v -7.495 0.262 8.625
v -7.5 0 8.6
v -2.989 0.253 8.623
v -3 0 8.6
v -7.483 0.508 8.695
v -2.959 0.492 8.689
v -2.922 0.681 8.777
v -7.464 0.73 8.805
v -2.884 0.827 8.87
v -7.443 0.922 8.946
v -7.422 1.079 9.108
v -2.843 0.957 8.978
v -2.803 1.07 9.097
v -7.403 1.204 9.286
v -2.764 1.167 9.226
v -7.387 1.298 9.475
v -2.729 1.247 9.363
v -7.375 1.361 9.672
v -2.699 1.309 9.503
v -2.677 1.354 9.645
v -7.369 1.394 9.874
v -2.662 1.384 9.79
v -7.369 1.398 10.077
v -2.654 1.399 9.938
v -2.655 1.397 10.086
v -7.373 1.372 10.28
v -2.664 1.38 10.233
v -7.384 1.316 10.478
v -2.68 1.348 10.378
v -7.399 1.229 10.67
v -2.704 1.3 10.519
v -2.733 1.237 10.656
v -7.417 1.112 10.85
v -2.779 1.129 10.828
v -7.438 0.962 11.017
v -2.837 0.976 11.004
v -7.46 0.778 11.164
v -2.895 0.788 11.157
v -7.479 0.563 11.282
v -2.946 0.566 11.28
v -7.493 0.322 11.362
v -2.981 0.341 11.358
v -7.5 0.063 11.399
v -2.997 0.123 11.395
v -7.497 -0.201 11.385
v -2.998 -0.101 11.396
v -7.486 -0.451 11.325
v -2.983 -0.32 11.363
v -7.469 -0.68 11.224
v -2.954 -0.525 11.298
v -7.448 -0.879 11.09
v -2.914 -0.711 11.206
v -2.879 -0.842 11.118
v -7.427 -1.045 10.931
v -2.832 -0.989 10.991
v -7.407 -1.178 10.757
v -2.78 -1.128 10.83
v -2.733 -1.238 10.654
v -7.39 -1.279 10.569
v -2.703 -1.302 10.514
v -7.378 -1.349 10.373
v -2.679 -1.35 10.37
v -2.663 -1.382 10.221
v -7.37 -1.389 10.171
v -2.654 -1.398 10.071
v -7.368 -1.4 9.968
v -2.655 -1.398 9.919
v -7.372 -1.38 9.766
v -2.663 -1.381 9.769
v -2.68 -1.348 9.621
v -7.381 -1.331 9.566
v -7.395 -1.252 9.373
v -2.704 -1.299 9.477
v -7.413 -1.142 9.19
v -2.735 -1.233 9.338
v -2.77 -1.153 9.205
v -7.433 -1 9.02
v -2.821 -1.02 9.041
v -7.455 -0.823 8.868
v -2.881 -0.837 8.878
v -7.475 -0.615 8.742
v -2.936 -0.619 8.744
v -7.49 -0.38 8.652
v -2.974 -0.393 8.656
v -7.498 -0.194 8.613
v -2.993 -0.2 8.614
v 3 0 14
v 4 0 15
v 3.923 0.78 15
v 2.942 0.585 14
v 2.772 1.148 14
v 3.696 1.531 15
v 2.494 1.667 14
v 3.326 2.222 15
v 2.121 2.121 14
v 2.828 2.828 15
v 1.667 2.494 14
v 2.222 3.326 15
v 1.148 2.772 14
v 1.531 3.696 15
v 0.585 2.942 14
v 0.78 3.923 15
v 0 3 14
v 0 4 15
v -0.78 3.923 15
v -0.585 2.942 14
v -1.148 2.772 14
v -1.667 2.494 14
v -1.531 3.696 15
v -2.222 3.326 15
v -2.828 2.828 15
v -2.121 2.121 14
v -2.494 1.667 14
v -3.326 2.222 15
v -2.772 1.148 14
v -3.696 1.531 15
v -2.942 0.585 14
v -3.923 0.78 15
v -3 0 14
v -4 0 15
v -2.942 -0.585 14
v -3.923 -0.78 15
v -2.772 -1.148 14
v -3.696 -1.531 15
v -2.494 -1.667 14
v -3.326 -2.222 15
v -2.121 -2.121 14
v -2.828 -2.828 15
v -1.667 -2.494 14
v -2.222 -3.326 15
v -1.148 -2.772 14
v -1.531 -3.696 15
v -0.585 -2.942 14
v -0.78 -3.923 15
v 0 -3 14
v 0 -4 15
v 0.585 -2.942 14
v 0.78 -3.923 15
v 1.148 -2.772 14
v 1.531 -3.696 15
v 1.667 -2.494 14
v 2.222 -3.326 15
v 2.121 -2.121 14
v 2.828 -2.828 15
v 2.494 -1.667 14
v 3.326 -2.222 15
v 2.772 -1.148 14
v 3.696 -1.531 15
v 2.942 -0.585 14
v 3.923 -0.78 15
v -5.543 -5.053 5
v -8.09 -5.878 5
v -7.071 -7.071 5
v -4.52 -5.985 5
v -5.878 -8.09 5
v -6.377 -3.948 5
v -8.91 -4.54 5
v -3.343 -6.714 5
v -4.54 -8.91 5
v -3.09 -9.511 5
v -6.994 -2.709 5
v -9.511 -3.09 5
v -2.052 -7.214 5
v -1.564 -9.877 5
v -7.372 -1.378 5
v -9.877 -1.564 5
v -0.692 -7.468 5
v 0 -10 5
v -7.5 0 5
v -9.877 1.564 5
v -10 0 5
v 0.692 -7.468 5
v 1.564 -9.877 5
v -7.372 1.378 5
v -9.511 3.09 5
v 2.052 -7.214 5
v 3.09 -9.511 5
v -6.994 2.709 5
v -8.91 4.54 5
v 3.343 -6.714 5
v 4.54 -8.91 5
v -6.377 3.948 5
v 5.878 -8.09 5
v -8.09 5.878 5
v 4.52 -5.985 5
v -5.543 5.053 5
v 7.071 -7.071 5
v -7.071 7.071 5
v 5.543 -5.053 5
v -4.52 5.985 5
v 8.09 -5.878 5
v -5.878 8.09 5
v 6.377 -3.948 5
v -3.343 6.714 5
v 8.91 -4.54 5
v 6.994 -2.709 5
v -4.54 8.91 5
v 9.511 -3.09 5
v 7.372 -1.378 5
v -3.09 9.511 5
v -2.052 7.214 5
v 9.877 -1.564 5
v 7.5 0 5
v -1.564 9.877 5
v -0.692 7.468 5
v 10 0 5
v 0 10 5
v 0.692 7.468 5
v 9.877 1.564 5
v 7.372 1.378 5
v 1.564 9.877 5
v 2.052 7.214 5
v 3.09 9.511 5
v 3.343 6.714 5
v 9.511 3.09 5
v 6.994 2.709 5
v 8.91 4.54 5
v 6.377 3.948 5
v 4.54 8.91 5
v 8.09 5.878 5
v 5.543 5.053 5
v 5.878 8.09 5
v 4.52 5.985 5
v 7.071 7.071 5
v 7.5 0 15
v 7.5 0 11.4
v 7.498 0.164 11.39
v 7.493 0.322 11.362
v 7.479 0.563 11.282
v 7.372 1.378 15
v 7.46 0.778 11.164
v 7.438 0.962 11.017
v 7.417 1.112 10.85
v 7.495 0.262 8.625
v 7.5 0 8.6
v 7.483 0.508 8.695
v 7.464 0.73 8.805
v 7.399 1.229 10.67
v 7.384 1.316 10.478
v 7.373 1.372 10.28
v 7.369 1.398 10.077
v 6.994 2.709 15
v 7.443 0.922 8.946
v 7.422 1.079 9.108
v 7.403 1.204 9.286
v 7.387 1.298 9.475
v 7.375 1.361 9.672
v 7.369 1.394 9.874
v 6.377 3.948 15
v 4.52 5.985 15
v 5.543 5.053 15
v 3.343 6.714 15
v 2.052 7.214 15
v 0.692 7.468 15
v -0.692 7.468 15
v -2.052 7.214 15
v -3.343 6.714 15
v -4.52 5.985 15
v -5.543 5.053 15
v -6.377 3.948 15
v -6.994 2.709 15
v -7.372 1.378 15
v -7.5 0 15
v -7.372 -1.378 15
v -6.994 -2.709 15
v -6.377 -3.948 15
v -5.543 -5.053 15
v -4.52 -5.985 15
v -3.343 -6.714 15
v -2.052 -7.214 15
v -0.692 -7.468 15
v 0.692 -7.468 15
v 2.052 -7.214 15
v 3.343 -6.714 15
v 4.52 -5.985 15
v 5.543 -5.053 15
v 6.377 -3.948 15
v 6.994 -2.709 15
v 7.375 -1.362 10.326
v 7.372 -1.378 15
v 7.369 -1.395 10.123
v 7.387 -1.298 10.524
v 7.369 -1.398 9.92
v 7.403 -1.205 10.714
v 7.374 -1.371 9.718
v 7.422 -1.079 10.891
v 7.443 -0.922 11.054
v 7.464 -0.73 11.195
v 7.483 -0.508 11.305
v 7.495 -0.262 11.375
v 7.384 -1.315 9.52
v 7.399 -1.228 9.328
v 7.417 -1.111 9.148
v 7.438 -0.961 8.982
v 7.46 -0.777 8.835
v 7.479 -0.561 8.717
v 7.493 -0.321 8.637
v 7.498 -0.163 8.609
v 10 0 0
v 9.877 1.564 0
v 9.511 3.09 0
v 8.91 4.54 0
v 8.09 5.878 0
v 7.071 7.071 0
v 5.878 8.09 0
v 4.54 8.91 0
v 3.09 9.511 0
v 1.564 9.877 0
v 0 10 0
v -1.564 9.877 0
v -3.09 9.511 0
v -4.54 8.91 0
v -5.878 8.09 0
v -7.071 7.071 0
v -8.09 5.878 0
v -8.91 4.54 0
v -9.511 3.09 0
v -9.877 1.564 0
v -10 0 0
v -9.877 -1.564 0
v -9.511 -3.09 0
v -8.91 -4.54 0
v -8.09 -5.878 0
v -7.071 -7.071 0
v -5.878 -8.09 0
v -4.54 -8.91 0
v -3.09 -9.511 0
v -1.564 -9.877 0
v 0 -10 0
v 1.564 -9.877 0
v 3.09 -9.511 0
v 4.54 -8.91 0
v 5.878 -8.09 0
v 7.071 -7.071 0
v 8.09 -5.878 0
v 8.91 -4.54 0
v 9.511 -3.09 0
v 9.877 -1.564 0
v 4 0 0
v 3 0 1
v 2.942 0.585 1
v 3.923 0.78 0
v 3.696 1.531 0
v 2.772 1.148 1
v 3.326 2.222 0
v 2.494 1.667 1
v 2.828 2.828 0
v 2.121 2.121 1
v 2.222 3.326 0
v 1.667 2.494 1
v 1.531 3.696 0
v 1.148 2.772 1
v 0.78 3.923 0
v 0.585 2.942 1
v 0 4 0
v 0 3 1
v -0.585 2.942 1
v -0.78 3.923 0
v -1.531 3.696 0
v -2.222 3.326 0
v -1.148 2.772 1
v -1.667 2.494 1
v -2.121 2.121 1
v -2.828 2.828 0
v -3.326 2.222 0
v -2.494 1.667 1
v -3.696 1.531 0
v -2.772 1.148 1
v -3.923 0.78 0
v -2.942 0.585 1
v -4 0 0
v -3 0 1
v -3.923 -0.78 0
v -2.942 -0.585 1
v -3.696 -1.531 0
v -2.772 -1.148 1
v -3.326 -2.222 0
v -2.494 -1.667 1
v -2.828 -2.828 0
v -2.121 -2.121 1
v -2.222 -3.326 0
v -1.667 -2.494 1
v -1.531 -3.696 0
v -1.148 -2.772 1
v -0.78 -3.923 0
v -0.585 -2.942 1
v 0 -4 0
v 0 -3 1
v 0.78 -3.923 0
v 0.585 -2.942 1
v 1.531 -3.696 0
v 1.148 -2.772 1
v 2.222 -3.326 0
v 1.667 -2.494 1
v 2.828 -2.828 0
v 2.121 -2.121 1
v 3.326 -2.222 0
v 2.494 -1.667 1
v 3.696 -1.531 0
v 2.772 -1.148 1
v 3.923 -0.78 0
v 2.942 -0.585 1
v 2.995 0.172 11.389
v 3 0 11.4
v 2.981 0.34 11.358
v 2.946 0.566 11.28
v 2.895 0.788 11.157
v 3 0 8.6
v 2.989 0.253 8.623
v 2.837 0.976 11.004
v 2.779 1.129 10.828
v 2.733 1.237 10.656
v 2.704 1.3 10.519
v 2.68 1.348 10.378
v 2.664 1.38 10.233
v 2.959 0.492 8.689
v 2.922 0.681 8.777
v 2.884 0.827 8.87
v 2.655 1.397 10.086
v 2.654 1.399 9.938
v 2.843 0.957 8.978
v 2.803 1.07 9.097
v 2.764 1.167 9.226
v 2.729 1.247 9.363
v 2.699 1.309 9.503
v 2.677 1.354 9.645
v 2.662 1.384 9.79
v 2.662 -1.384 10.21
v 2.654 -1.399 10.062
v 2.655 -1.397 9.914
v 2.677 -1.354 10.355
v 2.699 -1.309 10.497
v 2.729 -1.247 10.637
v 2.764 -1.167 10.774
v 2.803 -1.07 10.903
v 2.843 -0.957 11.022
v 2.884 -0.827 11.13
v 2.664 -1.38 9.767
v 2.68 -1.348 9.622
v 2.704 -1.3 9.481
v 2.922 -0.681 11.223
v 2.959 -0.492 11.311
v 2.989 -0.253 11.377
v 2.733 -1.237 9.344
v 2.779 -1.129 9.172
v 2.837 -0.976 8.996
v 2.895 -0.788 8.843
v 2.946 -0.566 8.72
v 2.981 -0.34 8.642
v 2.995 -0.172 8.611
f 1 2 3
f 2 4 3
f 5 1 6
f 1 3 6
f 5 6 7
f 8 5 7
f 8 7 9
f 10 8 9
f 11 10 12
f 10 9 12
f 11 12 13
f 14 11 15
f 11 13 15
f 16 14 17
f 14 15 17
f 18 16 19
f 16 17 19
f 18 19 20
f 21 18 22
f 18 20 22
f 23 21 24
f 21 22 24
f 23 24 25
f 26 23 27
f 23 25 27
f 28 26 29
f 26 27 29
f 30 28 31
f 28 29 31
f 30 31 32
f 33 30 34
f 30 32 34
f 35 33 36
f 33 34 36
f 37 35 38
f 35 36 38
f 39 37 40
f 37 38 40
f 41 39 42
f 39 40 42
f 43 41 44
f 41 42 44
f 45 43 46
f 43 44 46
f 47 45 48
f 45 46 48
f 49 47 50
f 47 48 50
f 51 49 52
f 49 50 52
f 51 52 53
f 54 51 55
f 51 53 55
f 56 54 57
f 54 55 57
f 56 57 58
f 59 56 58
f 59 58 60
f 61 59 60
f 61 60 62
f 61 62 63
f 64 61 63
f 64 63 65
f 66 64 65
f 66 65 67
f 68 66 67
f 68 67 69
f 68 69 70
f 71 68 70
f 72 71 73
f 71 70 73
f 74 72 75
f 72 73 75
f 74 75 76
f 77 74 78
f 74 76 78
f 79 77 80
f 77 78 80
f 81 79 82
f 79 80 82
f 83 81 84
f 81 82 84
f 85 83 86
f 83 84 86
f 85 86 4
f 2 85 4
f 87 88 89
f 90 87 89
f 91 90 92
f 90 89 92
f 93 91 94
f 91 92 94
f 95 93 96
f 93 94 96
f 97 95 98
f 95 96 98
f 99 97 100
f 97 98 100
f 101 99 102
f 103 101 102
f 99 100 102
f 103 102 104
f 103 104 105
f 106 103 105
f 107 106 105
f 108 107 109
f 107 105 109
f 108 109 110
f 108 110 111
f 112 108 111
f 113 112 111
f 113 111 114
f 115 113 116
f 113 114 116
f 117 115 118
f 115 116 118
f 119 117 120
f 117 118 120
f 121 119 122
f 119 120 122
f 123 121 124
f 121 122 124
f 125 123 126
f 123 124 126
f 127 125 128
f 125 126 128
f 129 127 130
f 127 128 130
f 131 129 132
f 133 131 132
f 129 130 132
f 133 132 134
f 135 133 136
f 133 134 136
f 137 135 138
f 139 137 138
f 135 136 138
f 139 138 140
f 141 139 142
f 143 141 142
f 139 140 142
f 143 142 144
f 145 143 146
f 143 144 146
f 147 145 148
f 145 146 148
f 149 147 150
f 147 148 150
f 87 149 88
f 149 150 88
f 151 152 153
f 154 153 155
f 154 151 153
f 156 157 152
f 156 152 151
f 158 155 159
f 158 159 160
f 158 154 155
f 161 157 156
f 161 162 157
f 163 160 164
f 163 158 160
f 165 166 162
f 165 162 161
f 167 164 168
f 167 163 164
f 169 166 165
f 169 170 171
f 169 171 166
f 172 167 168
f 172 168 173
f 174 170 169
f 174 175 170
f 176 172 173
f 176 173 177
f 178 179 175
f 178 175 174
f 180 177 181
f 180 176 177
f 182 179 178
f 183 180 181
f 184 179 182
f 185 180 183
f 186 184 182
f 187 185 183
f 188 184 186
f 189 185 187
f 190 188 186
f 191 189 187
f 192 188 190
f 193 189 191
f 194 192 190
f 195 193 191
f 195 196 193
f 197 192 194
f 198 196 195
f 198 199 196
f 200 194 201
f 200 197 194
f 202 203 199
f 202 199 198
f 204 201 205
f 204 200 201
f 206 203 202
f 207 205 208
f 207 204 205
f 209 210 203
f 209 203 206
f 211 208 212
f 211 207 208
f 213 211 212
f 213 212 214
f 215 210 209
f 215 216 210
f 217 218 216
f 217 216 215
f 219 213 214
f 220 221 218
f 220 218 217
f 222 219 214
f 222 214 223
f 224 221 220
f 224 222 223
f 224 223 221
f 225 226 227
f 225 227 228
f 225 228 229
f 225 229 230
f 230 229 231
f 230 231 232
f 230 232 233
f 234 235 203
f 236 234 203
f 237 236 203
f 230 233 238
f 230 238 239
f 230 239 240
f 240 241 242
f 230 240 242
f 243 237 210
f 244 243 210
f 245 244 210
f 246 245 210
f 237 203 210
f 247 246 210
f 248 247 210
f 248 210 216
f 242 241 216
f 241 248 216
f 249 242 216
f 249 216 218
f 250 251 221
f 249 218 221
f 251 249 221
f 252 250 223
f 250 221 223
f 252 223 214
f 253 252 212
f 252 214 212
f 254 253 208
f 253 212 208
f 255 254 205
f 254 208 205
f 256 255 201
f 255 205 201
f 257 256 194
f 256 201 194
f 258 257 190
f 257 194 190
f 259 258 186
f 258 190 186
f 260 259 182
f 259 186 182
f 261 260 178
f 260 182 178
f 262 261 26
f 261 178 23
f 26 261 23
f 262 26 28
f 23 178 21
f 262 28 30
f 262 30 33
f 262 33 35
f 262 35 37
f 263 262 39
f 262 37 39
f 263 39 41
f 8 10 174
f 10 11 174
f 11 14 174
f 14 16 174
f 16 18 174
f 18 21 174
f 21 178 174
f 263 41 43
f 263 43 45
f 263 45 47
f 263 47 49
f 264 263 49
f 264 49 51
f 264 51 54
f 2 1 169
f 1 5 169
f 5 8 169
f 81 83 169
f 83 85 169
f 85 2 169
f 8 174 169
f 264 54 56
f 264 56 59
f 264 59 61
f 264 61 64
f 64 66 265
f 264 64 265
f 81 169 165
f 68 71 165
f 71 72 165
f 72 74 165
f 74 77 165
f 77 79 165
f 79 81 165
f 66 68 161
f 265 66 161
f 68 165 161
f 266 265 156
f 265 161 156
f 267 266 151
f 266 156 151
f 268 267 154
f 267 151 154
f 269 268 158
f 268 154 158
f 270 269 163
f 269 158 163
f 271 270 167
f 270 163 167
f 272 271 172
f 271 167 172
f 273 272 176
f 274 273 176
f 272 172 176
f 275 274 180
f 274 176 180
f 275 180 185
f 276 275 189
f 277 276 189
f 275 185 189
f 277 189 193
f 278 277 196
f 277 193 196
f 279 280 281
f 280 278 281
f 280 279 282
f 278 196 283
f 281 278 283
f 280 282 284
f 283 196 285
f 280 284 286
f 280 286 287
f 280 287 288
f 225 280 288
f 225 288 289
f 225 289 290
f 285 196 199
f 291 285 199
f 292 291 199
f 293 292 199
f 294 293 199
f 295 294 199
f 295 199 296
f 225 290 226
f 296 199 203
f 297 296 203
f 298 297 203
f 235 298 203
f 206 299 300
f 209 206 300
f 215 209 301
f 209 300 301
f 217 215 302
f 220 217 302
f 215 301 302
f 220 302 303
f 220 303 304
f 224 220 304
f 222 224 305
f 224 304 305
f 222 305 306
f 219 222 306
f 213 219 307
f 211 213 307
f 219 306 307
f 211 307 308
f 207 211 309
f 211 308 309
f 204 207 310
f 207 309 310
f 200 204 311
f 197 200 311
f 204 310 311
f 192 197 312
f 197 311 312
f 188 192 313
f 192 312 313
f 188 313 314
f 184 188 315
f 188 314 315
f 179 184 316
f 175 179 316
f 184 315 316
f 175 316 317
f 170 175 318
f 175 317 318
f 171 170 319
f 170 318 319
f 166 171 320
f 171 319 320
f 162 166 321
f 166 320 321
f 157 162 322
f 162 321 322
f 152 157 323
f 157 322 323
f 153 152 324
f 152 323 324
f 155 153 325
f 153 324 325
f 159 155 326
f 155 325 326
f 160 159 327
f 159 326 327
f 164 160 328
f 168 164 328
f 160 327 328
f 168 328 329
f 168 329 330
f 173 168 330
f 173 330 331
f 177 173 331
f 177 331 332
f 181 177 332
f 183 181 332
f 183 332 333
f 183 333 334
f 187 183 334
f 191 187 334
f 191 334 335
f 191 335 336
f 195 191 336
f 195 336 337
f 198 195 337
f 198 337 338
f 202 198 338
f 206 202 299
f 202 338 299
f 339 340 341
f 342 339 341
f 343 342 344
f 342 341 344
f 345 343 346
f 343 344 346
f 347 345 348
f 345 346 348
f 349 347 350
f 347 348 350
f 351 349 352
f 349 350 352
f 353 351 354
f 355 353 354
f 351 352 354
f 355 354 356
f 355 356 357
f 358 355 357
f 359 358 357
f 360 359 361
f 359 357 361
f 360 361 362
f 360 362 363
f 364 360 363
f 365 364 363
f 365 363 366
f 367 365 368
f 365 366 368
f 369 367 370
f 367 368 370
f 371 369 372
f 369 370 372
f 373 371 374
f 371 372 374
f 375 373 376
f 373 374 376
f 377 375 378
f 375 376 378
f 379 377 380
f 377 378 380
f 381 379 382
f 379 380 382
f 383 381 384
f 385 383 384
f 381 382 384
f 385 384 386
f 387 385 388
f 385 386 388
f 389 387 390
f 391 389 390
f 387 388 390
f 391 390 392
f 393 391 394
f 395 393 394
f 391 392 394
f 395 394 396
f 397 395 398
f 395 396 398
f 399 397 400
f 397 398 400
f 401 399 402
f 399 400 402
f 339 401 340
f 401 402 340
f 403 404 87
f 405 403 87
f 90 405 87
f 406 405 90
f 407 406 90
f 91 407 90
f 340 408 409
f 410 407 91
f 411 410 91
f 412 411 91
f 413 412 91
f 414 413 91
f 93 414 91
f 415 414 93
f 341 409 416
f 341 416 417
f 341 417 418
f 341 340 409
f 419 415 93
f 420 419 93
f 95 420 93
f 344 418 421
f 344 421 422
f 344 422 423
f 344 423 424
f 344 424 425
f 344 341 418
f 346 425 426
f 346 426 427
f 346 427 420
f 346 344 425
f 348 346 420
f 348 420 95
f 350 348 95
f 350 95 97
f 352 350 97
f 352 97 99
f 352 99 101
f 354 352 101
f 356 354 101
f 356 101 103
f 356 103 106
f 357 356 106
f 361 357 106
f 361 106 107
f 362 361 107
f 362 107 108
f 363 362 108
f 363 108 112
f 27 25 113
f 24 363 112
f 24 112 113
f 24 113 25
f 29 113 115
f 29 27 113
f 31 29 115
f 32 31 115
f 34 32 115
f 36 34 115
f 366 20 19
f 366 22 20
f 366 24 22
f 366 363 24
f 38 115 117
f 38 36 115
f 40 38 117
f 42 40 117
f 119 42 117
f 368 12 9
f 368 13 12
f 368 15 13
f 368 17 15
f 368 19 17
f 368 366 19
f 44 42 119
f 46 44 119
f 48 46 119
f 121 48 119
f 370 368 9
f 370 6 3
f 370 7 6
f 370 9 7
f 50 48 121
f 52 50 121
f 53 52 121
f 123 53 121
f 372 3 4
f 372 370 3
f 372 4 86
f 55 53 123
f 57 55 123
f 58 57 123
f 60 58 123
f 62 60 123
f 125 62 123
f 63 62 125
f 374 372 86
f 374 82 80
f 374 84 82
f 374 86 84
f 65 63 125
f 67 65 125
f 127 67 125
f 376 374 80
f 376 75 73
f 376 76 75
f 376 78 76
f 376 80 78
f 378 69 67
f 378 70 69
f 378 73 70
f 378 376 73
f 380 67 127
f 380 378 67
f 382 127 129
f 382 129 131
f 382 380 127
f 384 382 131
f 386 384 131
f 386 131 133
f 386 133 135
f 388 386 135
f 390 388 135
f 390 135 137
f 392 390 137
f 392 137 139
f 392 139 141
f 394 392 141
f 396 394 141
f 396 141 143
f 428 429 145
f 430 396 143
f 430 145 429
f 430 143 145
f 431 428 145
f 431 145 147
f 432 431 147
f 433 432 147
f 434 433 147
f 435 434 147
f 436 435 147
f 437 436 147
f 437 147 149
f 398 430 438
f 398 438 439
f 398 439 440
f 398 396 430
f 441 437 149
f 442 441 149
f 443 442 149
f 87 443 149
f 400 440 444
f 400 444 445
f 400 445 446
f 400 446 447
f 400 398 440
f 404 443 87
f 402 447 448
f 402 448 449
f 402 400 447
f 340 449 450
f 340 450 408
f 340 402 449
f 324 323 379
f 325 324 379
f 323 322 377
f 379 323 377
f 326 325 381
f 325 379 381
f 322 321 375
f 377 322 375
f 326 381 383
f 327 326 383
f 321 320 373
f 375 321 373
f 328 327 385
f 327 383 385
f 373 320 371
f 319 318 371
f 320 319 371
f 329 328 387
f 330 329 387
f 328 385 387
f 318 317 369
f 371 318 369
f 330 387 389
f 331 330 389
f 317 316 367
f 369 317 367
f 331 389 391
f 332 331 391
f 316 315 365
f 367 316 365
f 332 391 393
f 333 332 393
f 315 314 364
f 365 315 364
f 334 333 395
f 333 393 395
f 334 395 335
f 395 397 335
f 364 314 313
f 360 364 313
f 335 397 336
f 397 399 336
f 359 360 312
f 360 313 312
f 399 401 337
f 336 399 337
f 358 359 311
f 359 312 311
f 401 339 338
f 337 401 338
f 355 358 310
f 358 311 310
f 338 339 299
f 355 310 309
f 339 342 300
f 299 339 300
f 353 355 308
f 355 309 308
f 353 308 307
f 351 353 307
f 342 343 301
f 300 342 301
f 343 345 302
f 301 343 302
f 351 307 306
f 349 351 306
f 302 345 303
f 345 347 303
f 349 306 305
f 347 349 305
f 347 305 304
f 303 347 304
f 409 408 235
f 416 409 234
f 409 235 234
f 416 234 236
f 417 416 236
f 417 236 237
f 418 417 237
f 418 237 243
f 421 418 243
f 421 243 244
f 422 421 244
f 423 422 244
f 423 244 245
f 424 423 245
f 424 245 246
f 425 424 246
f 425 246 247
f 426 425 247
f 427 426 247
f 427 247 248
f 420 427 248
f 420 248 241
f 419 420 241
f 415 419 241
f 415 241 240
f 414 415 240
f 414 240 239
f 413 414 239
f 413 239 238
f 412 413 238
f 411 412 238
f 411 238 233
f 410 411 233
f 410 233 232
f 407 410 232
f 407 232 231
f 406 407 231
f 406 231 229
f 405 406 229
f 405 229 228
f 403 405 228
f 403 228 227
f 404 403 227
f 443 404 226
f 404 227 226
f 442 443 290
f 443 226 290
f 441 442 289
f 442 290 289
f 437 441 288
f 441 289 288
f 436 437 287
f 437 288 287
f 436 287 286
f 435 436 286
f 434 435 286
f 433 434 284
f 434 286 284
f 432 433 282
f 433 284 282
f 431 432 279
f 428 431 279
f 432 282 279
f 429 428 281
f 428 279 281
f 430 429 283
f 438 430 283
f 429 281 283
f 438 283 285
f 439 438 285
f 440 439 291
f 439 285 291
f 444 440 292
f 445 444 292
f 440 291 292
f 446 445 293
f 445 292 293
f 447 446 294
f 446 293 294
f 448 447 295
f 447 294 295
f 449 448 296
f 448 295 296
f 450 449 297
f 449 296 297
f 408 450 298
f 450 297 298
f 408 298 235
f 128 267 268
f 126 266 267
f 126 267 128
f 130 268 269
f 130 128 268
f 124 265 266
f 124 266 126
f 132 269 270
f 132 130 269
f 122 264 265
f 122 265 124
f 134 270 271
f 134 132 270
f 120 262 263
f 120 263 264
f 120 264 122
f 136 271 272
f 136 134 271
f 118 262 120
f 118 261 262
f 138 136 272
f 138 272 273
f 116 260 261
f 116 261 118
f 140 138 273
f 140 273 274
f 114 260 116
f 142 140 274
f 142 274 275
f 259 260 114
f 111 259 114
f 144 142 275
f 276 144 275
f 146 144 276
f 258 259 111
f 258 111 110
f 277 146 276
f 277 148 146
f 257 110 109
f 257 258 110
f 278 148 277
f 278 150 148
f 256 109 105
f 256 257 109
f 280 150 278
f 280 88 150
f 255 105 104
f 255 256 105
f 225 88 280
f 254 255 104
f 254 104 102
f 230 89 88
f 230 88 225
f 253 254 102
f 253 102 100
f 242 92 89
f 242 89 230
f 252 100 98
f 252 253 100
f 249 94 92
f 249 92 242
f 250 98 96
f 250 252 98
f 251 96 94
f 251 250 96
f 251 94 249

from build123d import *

# Parameters (mm, degrees)
SKETCH_1_R          = 7.5
SKETCH_1_R_2        = 3
EXTRUDE_1_DEPTH     = 15
SKETCH_1_3_R        = 10
SKETCH_1_3_R_2      = 7.5
EXTRUDE_2_DEPTH     = 5
SKETCH_2_R          = 1.4
CUT_EXTRUDE_1_DEPTH = 22.5
CHAMFER_1_SIZE      = 1


with BuildPart() as part:
    # 스케치1 → 보스-돌출1 (new body)
    with BuildSketch(Plane.XY):
        Circle(SKETCH_1_R)
        Circle(SKETCH_1_R_2, mode=Mode.SUBTRACT)
    extrude(amount=EXTRUDE_1_DEPTH)

    # 스케치1<3> → 보스-돌출2 (add)
    with BuildSketch(Plane.XY):
        Circle(SKETCH_1_3_R)
        Circle(SKETCH_1_3_R_2, mode=Mode.SUBTRACT)
    extrude(amount=EXTRUDE_2_DEPTH)

    # 스케치2 → 컷-돌출1 (cut, symmetric)
    with BuildSketch(Plane(origin=(0, 0, 0), x_dir=(0, 0, -1), z_dir=(1, 0, 0))):
        with Locations((-10, 0)):
            Circle(SKETCH_2_R)
    extrude(amount=CUT_EXTRUDE_1_DEPTH, both=True, mode=Mode.SUBTRACT)

    # 모따기1
    chamfer_1_edges = [part.edges().sort_by_distance(p)[0] for p in [
        (-3, 0, 0),
        (-3, 0, 15),
    ]]
    chamfer(chamfer_1_edges, length=CHAMFER_1_SIZE)


solid = part.part
